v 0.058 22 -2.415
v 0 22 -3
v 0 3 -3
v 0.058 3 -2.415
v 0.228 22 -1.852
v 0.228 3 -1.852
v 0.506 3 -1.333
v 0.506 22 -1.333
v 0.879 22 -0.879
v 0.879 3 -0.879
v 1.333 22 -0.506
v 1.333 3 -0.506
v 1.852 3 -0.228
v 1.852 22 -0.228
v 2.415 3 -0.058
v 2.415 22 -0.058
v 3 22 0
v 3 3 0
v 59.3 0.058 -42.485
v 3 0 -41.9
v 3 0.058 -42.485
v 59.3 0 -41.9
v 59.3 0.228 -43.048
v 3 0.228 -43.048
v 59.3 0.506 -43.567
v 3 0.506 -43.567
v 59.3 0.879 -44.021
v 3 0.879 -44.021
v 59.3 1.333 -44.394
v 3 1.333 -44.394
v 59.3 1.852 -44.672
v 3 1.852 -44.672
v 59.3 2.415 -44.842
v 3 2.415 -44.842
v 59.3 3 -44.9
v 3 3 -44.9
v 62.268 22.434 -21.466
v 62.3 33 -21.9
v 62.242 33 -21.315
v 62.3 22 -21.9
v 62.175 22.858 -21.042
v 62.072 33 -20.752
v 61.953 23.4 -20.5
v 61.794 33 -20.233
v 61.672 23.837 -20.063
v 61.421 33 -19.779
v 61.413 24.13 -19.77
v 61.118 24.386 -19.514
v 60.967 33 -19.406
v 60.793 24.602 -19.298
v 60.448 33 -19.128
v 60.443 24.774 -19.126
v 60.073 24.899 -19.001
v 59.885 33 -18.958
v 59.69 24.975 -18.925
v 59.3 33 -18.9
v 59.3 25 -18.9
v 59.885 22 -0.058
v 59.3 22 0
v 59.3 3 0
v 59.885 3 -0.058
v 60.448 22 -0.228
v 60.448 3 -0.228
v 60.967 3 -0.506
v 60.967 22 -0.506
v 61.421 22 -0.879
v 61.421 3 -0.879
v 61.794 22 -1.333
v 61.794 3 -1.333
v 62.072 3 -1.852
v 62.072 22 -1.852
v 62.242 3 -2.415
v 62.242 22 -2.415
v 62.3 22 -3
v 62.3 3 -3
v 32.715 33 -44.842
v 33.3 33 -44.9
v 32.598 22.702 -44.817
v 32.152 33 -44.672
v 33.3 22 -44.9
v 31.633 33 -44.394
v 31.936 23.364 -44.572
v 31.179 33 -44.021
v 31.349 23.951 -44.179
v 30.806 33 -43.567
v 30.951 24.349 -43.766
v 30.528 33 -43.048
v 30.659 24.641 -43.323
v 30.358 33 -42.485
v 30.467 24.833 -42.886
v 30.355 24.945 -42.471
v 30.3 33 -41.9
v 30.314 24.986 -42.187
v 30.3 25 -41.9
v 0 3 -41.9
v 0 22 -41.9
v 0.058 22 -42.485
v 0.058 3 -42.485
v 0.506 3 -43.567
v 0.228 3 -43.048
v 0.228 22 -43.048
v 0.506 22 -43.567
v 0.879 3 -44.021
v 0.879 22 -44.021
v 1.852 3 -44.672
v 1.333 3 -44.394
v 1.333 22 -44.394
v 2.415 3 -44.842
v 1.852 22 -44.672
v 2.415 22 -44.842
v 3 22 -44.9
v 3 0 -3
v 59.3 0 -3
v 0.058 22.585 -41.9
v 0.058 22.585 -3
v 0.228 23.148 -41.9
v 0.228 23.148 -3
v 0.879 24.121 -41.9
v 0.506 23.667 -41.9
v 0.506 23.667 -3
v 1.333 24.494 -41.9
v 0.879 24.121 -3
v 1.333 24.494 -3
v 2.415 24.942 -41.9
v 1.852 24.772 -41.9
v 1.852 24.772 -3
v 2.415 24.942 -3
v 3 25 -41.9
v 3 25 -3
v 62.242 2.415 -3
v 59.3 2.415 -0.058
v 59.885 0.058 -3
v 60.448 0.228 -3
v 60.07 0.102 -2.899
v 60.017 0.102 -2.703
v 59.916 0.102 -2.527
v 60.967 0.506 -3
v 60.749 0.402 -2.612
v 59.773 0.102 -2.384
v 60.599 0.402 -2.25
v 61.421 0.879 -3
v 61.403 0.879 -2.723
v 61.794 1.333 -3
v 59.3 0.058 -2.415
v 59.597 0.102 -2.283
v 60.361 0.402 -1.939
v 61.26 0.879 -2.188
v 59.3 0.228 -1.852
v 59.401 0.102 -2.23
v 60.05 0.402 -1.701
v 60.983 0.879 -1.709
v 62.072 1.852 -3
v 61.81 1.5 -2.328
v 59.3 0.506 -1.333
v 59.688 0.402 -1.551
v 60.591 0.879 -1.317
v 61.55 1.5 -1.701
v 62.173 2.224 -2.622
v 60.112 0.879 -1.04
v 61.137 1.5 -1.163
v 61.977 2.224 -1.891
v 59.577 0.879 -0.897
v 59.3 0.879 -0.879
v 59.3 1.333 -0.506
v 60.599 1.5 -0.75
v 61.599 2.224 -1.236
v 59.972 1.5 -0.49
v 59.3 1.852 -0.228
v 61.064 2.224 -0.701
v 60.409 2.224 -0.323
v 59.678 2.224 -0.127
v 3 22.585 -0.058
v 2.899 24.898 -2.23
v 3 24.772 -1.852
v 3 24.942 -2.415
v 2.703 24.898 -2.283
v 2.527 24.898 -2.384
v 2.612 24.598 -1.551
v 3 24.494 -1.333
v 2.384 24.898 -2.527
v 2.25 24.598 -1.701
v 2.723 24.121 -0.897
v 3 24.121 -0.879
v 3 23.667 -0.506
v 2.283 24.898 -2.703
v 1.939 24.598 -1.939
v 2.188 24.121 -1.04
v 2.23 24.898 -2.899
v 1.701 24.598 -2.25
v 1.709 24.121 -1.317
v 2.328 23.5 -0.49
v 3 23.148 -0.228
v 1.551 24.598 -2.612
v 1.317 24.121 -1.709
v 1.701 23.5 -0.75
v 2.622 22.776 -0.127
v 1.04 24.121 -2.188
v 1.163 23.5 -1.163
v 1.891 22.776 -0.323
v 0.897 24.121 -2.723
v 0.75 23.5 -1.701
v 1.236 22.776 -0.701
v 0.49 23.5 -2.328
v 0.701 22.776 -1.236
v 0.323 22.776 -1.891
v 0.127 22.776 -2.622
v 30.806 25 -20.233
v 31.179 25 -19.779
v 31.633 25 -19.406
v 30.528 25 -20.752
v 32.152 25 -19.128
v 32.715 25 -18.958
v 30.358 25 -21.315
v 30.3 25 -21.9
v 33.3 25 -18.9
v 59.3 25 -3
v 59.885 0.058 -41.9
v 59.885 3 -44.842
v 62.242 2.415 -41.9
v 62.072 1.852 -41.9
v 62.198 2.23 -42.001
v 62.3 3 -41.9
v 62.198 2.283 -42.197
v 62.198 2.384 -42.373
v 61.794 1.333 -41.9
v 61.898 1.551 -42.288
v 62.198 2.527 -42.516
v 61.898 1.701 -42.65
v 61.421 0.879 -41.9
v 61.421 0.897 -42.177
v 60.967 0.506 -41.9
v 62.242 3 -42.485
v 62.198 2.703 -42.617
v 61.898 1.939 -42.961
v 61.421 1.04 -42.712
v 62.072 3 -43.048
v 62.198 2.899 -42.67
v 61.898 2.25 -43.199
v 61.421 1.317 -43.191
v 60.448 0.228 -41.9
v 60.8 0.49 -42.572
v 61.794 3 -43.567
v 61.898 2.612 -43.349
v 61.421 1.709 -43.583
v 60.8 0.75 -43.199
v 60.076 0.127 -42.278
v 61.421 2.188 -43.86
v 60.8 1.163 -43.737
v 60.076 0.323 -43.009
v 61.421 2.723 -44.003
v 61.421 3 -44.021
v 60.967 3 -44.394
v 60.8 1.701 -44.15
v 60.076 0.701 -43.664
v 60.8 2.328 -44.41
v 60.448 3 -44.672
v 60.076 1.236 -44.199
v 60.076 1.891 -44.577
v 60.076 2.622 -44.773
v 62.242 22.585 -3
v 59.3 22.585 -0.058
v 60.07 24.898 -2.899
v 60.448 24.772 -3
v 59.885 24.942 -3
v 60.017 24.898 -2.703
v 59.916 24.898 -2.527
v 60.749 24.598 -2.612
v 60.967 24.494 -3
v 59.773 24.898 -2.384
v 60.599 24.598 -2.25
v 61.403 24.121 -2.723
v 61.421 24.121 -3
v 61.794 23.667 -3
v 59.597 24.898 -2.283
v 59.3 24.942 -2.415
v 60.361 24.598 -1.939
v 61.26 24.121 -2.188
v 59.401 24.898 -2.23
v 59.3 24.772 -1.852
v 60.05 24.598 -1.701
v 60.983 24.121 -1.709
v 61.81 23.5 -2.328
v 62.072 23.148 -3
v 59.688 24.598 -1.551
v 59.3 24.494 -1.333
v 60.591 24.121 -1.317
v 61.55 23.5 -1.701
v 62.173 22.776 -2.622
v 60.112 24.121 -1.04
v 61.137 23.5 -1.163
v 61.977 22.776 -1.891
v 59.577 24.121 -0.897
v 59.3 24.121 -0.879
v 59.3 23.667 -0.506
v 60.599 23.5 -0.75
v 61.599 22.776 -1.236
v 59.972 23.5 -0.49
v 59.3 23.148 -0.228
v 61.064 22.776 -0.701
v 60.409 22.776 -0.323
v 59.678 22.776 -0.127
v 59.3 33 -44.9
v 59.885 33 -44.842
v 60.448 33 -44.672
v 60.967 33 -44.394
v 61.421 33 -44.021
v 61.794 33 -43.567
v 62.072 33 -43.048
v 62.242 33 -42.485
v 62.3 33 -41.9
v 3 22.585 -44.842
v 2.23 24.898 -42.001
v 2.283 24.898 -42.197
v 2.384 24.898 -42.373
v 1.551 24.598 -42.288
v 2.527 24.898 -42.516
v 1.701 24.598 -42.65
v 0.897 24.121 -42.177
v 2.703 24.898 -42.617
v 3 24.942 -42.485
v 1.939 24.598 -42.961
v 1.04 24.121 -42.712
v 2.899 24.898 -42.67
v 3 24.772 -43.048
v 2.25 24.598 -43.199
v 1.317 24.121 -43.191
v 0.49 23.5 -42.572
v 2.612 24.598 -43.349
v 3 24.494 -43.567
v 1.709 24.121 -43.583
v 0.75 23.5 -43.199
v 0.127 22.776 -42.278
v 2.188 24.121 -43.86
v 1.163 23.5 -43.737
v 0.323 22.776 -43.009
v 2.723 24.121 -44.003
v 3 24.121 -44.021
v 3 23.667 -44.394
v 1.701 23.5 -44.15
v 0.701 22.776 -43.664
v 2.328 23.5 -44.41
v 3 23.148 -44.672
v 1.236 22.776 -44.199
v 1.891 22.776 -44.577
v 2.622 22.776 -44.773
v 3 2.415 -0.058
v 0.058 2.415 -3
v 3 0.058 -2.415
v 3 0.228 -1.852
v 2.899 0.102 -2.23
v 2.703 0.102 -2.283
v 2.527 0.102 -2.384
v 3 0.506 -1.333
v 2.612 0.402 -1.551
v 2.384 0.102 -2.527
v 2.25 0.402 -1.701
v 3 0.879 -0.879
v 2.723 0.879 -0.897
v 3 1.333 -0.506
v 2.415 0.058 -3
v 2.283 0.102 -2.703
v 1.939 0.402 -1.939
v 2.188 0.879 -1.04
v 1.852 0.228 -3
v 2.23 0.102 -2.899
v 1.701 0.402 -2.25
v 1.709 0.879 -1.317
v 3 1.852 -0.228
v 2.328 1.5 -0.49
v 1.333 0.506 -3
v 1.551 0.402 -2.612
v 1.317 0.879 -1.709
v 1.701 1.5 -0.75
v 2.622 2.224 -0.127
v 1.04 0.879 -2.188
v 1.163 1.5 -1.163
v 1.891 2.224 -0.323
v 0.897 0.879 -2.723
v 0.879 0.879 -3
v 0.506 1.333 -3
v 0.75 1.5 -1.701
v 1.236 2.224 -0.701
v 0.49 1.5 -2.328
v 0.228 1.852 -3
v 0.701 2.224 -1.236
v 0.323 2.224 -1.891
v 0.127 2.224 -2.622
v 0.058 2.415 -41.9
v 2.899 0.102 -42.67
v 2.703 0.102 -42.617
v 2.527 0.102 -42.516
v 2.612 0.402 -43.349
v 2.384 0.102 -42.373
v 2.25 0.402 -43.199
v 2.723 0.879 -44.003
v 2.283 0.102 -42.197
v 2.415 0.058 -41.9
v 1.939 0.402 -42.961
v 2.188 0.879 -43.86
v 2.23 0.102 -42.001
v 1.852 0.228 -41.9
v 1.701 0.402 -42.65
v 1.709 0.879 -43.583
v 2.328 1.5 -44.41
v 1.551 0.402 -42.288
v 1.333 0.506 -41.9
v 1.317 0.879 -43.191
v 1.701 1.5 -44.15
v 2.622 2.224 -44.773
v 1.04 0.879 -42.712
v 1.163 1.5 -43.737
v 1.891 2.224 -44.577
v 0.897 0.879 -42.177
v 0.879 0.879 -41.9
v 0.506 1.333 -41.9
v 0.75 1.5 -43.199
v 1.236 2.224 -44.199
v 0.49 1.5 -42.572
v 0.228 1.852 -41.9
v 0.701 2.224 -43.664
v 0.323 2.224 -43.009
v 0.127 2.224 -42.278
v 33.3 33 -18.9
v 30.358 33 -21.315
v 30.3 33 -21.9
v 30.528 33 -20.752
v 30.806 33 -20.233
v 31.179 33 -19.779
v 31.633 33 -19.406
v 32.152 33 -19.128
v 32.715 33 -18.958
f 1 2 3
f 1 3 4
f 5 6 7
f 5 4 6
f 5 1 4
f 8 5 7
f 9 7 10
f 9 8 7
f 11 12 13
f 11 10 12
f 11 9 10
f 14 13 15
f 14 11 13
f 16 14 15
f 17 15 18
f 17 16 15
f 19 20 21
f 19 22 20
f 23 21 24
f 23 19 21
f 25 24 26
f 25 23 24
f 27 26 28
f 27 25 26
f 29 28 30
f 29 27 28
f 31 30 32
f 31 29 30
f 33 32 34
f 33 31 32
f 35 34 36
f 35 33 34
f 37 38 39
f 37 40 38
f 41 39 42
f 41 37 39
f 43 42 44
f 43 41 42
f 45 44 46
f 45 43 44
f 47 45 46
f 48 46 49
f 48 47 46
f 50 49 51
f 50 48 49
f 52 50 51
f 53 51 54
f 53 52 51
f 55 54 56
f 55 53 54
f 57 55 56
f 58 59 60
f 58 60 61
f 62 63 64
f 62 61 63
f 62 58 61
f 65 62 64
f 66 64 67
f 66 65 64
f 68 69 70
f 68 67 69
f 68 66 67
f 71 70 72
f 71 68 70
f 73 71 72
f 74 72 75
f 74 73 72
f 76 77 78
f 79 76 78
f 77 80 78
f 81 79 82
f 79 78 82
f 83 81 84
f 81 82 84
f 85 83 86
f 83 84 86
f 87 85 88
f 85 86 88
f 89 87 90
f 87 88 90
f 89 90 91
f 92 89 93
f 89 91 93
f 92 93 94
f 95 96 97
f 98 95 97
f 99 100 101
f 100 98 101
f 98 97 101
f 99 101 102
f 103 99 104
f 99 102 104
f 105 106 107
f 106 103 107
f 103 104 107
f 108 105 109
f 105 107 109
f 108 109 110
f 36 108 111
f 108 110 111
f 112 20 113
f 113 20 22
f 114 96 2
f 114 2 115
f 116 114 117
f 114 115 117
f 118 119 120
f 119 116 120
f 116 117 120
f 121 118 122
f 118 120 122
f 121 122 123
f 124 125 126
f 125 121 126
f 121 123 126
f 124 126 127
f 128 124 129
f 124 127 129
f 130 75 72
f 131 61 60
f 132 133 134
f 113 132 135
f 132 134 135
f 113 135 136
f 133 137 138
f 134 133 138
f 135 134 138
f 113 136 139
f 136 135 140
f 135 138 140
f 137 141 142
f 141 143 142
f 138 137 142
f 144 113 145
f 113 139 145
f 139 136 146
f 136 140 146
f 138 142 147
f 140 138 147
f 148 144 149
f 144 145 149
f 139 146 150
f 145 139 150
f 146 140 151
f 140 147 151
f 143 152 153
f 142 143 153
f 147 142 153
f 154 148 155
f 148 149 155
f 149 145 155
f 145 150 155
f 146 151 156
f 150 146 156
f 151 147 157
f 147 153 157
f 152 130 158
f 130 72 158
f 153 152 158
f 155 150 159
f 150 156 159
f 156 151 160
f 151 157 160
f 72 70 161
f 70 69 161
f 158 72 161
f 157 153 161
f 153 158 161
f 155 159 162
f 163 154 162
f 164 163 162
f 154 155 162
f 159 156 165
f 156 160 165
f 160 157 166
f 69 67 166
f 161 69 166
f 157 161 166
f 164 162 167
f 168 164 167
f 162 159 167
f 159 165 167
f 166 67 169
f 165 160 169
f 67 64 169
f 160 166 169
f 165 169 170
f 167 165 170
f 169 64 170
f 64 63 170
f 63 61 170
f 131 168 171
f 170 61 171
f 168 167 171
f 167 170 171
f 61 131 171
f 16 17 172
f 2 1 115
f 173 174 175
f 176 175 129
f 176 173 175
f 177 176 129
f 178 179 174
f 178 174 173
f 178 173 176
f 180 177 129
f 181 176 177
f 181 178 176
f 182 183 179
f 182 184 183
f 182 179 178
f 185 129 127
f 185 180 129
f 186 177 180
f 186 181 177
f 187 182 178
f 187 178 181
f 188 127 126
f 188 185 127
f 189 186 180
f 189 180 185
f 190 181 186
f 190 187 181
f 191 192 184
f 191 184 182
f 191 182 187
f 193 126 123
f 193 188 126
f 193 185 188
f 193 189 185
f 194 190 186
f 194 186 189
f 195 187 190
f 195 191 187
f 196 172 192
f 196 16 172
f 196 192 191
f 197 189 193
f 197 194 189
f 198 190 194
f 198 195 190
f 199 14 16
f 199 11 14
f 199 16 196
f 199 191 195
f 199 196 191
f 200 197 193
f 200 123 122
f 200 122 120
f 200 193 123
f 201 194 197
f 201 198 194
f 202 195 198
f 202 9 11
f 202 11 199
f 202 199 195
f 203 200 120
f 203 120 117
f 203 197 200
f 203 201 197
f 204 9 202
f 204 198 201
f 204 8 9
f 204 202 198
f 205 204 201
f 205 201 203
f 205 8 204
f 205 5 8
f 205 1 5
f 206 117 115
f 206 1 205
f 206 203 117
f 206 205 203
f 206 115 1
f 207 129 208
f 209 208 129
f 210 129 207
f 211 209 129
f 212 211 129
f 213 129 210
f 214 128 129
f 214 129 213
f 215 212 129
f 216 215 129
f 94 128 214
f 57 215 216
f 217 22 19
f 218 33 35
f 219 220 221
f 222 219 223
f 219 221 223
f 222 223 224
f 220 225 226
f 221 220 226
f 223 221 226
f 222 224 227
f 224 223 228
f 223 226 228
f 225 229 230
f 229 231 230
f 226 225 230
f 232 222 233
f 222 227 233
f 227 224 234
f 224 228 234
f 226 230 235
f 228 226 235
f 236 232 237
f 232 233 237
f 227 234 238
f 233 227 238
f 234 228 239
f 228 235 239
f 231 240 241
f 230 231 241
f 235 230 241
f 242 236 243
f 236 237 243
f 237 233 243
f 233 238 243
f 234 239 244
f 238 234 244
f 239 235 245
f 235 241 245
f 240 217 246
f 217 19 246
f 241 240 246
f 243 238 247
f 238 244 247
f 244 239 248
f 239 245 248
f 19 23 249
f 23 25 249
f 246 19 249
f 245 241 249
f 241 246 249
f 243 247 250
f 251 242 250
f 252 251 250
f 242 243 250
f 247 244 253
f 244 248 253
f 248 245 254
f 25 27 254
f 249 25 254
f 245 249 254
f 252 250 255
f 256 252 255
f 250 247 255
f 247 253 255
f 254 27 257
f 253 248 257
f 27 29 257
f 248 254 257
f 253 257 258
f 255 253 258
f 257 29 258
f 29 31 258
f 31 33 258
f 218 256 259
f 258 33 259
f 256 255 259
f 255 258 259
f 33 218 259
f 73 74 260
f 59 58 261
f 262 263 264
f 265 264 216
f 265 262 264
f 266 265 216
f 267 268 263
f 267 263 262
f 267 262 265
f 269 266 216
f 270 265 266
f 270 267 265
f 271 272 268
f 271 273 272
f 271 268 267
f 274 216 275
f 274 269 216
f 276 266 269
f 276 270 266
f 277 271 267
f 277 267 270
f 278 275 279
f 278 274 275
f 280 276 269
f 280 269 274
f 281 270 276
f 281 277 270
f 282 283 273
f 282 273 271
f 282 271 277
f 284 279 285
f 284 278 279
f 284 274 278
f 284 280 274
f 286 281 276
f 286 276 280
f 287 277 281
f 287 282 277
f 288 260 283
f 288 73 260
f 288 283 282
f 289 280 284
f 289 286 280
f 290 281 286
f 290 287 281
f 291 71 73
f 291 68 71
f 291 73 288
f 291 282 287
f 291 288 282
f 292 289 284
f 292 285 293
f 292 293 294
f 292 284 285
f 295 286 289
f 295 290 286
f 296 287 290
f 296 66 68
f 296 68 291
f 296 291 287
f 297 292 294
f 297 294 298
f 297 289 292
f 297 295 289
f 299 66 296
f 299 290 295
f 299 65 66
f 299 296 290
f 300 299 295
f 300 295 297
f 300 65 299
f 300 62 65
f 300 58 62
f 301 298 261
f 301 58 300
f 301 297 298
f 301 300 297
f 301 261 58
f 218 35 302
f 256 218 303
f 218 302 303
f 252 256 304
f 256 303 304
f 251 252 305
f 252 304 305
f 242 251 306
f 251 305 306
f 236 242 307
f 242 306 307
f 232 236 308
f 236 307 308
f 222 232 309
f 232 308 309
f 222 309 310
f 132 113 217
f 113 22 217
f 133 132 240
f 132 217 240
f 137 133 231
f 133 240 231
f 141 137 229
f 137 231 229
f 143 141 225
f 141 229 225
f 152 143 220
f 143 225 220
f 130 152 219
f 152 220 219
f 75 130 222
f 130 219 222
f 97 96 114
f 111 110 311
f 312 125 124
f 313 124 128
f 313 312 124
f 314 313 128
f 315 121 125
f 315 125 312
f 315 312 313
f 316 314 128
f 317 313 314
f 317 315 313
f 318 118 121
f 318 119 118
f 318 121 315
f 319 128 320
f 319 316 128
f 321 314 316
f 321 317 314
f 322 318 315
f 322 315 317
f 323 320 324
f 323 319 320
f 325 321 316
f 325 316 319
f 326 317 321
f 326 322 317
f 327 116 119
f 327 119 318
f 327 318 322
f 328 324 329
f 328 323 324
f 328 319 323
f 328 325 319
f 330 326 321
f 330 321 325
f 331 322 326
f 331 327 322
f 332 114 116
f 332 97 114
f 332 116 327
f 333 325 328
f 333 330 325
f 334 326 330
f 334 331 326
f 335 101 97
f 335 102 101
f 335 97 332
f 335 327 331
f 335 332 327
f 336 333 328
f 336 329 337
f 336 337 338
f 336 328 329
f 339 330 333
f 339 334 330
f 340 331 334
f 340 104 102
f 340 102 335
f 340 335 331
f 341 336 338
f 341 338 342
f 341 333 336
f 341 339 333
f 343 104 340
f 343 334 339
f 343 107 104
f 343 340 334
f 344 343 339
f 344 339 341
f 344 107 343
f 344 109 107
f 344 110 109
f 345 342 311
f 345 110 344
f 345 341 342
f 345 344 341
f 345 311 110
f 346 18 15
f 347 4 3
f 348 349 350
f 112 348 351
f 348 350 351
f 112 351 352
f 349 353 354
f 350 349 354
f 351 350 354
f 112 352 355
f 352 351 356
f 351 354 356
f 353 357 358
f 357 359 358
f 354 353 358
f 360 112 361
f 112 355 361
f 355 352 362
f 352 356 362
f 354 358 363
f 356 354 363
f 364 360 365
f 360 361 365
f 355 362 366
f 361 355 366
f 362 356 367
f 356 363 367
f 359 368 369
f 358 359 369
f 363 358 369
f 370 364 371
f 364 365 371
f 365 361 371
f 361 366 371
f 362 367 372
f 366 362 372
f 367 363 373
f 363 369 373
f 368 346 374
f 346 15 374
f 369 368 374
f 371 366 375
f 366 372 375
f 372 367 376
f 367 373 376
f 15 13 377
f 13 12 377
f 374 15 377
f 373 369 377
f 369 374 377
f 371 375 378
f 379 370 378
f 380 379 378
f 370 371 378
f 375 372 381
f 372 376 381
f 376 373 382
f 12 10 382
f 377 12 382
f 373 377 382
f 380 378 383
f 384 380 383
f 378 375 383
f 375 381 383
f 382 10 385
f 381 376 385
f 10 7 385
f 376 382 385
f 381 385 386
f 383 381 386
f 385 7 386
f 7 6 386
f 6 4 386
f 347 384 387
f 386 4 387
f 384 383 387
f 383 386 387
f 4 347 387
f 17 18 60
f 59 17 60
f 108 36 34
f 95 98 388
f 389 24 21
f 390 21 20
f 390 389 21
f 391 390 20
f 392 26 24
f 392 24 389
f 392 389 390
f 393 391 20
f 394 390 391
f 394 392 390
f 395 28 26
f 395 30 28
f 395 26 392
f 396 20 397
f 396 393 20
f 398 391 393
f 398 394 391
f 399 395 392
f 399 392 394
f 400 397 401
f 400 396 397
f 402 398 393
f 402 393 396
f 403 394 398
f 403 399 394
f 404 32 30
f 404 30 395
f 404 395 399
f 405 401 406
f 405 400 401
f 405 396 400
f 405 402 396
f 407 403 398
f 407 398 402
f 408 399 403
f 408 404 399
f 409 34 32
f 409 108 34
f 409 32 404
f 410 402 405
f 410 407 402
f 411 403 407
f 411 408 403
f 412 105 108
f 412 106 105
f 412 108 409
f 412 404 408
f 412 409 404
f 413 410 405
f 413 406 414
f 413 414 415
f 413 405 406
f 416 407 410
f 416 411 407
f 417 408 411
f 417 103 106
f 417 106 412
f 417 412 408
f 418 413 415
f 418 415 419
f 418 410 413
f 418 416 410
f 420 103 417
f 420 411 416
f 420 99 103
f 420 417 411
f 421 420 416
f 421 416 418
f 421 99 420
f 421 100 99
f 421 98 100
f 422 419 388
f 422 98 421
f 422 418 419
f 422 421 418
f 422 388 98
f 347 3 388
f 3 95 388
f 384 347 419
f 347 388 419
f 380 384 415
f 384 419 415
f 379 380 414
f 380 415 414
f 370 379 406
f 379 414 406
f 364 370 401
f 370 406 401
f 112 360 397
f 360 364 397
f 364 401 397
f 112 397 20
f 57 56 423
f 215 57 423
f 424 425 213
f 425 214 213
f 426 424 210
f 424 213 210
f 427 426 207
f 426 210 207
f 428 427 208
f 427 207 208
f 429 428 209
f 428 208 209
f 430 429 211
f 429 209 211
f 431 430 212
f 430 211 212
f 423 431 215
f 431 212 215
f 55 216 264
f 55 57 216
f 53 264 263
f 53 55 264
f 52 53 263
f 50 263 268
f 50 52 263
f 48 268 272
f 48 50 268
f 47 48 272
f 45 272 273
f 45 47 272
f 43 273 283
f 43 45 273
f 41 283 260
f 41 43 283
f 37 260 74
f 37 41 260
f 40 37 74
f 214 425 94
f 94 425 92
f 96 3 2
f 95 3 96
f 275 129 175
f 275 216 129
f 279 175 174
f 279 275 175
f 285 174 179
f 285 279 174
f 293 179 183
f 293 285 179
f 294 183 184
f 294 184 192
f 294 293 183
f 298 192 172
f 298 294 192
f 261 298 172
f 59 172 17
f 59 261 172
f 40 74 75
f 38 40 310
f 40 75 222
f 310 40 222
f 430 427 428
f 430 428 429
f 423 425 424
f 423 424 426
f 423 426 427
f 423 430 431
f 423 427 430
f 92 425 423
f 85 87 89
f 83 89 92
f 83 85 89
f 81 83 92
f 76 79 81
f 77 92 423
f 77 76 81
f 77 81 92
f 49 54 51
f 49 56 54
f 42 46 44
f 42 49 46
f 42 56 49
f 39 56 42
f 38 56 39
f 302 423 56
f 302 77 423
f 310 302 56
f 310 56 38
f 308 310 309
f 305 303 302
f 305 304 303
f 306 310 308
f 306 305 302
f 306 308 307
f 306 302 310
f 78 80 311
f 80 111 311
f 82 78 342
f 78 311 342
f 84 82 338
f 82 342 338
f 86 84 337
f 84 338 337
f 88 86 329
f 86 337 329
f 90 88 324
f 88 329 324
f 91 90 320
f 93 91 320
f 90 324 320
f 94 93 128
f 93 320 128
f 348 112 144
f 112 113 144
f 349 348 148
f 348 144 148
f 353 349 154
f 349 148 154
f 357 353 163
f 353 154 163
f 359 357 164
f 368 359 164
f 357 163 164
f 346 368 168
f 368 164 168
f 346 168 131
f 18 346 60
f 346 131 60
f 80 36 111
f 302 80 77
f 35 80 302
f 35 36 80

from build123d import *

# Parameters (mm, degrees)
SKETCH_1_W          = 62.3
SKETCH_1_H          = 44.9
EXTRUDE_1_DEPTH     = 33
CUT_EXTRUDE_1_DEPTH = 8
FILLET_1_R          = 3


with BuildPart() as part:
    # Эскиз1 → Бобышка-Вытянуть1 (new body)
    with BuildSketch(Plane(origin=(0, 0, 0), x_dir=(1, 0, 0), z_dir=(0, 1, 0))):
        with Locations((31.15, 22.45)):
            Rectangle(SKETCH_1_W, SKETCH_1_H)
    extrude(amount=EXTRUDE_1_DEPTH)

    # Эскиз3 → Вырез-Вытянуть1 (cut)
    with BuildSketch(Plane(origin=(0, 33, 0), x_dir=(1, 0, 0), z_dir=(0, 1, 0))):
        Polygon((30.3, 18.9), (30.3, 44.9), (0, 44.9), (0, 0), (62.3, 0), (62.3, 18.9), align=None)
    extrude(amount=-CUT_EXTRUDE_1_DEPTH, mode=Mode.SUBTRACT)

    # Скругление1
    fillet_1_edges = [part.edges().sort_by_distance(p)[0] for p in [
        (0, 12.5, -44.9),
        (62.3, 12.5, 0),
        (0, 12.5, 0),
        (30.3, 29, -44.9),
        (30.3, 29, -18.9),
        (62.3, 25, -9.45),
        (62.3, 29, -18.9),
        (31.15, 25, 0),
        (0, 25, -22.45),
        (15.15, 25, -44.9),
        (31.15, 0, -44.9),
        (62.3, 0, -22.45),
        (31.15, 0, 0),
        (0, 0, -22.45),
        (62.3, 16.5, -44.9),
    ]]
    fillet(fillet_1_edges, radius=FILLET_1_R)


solid = part.part
